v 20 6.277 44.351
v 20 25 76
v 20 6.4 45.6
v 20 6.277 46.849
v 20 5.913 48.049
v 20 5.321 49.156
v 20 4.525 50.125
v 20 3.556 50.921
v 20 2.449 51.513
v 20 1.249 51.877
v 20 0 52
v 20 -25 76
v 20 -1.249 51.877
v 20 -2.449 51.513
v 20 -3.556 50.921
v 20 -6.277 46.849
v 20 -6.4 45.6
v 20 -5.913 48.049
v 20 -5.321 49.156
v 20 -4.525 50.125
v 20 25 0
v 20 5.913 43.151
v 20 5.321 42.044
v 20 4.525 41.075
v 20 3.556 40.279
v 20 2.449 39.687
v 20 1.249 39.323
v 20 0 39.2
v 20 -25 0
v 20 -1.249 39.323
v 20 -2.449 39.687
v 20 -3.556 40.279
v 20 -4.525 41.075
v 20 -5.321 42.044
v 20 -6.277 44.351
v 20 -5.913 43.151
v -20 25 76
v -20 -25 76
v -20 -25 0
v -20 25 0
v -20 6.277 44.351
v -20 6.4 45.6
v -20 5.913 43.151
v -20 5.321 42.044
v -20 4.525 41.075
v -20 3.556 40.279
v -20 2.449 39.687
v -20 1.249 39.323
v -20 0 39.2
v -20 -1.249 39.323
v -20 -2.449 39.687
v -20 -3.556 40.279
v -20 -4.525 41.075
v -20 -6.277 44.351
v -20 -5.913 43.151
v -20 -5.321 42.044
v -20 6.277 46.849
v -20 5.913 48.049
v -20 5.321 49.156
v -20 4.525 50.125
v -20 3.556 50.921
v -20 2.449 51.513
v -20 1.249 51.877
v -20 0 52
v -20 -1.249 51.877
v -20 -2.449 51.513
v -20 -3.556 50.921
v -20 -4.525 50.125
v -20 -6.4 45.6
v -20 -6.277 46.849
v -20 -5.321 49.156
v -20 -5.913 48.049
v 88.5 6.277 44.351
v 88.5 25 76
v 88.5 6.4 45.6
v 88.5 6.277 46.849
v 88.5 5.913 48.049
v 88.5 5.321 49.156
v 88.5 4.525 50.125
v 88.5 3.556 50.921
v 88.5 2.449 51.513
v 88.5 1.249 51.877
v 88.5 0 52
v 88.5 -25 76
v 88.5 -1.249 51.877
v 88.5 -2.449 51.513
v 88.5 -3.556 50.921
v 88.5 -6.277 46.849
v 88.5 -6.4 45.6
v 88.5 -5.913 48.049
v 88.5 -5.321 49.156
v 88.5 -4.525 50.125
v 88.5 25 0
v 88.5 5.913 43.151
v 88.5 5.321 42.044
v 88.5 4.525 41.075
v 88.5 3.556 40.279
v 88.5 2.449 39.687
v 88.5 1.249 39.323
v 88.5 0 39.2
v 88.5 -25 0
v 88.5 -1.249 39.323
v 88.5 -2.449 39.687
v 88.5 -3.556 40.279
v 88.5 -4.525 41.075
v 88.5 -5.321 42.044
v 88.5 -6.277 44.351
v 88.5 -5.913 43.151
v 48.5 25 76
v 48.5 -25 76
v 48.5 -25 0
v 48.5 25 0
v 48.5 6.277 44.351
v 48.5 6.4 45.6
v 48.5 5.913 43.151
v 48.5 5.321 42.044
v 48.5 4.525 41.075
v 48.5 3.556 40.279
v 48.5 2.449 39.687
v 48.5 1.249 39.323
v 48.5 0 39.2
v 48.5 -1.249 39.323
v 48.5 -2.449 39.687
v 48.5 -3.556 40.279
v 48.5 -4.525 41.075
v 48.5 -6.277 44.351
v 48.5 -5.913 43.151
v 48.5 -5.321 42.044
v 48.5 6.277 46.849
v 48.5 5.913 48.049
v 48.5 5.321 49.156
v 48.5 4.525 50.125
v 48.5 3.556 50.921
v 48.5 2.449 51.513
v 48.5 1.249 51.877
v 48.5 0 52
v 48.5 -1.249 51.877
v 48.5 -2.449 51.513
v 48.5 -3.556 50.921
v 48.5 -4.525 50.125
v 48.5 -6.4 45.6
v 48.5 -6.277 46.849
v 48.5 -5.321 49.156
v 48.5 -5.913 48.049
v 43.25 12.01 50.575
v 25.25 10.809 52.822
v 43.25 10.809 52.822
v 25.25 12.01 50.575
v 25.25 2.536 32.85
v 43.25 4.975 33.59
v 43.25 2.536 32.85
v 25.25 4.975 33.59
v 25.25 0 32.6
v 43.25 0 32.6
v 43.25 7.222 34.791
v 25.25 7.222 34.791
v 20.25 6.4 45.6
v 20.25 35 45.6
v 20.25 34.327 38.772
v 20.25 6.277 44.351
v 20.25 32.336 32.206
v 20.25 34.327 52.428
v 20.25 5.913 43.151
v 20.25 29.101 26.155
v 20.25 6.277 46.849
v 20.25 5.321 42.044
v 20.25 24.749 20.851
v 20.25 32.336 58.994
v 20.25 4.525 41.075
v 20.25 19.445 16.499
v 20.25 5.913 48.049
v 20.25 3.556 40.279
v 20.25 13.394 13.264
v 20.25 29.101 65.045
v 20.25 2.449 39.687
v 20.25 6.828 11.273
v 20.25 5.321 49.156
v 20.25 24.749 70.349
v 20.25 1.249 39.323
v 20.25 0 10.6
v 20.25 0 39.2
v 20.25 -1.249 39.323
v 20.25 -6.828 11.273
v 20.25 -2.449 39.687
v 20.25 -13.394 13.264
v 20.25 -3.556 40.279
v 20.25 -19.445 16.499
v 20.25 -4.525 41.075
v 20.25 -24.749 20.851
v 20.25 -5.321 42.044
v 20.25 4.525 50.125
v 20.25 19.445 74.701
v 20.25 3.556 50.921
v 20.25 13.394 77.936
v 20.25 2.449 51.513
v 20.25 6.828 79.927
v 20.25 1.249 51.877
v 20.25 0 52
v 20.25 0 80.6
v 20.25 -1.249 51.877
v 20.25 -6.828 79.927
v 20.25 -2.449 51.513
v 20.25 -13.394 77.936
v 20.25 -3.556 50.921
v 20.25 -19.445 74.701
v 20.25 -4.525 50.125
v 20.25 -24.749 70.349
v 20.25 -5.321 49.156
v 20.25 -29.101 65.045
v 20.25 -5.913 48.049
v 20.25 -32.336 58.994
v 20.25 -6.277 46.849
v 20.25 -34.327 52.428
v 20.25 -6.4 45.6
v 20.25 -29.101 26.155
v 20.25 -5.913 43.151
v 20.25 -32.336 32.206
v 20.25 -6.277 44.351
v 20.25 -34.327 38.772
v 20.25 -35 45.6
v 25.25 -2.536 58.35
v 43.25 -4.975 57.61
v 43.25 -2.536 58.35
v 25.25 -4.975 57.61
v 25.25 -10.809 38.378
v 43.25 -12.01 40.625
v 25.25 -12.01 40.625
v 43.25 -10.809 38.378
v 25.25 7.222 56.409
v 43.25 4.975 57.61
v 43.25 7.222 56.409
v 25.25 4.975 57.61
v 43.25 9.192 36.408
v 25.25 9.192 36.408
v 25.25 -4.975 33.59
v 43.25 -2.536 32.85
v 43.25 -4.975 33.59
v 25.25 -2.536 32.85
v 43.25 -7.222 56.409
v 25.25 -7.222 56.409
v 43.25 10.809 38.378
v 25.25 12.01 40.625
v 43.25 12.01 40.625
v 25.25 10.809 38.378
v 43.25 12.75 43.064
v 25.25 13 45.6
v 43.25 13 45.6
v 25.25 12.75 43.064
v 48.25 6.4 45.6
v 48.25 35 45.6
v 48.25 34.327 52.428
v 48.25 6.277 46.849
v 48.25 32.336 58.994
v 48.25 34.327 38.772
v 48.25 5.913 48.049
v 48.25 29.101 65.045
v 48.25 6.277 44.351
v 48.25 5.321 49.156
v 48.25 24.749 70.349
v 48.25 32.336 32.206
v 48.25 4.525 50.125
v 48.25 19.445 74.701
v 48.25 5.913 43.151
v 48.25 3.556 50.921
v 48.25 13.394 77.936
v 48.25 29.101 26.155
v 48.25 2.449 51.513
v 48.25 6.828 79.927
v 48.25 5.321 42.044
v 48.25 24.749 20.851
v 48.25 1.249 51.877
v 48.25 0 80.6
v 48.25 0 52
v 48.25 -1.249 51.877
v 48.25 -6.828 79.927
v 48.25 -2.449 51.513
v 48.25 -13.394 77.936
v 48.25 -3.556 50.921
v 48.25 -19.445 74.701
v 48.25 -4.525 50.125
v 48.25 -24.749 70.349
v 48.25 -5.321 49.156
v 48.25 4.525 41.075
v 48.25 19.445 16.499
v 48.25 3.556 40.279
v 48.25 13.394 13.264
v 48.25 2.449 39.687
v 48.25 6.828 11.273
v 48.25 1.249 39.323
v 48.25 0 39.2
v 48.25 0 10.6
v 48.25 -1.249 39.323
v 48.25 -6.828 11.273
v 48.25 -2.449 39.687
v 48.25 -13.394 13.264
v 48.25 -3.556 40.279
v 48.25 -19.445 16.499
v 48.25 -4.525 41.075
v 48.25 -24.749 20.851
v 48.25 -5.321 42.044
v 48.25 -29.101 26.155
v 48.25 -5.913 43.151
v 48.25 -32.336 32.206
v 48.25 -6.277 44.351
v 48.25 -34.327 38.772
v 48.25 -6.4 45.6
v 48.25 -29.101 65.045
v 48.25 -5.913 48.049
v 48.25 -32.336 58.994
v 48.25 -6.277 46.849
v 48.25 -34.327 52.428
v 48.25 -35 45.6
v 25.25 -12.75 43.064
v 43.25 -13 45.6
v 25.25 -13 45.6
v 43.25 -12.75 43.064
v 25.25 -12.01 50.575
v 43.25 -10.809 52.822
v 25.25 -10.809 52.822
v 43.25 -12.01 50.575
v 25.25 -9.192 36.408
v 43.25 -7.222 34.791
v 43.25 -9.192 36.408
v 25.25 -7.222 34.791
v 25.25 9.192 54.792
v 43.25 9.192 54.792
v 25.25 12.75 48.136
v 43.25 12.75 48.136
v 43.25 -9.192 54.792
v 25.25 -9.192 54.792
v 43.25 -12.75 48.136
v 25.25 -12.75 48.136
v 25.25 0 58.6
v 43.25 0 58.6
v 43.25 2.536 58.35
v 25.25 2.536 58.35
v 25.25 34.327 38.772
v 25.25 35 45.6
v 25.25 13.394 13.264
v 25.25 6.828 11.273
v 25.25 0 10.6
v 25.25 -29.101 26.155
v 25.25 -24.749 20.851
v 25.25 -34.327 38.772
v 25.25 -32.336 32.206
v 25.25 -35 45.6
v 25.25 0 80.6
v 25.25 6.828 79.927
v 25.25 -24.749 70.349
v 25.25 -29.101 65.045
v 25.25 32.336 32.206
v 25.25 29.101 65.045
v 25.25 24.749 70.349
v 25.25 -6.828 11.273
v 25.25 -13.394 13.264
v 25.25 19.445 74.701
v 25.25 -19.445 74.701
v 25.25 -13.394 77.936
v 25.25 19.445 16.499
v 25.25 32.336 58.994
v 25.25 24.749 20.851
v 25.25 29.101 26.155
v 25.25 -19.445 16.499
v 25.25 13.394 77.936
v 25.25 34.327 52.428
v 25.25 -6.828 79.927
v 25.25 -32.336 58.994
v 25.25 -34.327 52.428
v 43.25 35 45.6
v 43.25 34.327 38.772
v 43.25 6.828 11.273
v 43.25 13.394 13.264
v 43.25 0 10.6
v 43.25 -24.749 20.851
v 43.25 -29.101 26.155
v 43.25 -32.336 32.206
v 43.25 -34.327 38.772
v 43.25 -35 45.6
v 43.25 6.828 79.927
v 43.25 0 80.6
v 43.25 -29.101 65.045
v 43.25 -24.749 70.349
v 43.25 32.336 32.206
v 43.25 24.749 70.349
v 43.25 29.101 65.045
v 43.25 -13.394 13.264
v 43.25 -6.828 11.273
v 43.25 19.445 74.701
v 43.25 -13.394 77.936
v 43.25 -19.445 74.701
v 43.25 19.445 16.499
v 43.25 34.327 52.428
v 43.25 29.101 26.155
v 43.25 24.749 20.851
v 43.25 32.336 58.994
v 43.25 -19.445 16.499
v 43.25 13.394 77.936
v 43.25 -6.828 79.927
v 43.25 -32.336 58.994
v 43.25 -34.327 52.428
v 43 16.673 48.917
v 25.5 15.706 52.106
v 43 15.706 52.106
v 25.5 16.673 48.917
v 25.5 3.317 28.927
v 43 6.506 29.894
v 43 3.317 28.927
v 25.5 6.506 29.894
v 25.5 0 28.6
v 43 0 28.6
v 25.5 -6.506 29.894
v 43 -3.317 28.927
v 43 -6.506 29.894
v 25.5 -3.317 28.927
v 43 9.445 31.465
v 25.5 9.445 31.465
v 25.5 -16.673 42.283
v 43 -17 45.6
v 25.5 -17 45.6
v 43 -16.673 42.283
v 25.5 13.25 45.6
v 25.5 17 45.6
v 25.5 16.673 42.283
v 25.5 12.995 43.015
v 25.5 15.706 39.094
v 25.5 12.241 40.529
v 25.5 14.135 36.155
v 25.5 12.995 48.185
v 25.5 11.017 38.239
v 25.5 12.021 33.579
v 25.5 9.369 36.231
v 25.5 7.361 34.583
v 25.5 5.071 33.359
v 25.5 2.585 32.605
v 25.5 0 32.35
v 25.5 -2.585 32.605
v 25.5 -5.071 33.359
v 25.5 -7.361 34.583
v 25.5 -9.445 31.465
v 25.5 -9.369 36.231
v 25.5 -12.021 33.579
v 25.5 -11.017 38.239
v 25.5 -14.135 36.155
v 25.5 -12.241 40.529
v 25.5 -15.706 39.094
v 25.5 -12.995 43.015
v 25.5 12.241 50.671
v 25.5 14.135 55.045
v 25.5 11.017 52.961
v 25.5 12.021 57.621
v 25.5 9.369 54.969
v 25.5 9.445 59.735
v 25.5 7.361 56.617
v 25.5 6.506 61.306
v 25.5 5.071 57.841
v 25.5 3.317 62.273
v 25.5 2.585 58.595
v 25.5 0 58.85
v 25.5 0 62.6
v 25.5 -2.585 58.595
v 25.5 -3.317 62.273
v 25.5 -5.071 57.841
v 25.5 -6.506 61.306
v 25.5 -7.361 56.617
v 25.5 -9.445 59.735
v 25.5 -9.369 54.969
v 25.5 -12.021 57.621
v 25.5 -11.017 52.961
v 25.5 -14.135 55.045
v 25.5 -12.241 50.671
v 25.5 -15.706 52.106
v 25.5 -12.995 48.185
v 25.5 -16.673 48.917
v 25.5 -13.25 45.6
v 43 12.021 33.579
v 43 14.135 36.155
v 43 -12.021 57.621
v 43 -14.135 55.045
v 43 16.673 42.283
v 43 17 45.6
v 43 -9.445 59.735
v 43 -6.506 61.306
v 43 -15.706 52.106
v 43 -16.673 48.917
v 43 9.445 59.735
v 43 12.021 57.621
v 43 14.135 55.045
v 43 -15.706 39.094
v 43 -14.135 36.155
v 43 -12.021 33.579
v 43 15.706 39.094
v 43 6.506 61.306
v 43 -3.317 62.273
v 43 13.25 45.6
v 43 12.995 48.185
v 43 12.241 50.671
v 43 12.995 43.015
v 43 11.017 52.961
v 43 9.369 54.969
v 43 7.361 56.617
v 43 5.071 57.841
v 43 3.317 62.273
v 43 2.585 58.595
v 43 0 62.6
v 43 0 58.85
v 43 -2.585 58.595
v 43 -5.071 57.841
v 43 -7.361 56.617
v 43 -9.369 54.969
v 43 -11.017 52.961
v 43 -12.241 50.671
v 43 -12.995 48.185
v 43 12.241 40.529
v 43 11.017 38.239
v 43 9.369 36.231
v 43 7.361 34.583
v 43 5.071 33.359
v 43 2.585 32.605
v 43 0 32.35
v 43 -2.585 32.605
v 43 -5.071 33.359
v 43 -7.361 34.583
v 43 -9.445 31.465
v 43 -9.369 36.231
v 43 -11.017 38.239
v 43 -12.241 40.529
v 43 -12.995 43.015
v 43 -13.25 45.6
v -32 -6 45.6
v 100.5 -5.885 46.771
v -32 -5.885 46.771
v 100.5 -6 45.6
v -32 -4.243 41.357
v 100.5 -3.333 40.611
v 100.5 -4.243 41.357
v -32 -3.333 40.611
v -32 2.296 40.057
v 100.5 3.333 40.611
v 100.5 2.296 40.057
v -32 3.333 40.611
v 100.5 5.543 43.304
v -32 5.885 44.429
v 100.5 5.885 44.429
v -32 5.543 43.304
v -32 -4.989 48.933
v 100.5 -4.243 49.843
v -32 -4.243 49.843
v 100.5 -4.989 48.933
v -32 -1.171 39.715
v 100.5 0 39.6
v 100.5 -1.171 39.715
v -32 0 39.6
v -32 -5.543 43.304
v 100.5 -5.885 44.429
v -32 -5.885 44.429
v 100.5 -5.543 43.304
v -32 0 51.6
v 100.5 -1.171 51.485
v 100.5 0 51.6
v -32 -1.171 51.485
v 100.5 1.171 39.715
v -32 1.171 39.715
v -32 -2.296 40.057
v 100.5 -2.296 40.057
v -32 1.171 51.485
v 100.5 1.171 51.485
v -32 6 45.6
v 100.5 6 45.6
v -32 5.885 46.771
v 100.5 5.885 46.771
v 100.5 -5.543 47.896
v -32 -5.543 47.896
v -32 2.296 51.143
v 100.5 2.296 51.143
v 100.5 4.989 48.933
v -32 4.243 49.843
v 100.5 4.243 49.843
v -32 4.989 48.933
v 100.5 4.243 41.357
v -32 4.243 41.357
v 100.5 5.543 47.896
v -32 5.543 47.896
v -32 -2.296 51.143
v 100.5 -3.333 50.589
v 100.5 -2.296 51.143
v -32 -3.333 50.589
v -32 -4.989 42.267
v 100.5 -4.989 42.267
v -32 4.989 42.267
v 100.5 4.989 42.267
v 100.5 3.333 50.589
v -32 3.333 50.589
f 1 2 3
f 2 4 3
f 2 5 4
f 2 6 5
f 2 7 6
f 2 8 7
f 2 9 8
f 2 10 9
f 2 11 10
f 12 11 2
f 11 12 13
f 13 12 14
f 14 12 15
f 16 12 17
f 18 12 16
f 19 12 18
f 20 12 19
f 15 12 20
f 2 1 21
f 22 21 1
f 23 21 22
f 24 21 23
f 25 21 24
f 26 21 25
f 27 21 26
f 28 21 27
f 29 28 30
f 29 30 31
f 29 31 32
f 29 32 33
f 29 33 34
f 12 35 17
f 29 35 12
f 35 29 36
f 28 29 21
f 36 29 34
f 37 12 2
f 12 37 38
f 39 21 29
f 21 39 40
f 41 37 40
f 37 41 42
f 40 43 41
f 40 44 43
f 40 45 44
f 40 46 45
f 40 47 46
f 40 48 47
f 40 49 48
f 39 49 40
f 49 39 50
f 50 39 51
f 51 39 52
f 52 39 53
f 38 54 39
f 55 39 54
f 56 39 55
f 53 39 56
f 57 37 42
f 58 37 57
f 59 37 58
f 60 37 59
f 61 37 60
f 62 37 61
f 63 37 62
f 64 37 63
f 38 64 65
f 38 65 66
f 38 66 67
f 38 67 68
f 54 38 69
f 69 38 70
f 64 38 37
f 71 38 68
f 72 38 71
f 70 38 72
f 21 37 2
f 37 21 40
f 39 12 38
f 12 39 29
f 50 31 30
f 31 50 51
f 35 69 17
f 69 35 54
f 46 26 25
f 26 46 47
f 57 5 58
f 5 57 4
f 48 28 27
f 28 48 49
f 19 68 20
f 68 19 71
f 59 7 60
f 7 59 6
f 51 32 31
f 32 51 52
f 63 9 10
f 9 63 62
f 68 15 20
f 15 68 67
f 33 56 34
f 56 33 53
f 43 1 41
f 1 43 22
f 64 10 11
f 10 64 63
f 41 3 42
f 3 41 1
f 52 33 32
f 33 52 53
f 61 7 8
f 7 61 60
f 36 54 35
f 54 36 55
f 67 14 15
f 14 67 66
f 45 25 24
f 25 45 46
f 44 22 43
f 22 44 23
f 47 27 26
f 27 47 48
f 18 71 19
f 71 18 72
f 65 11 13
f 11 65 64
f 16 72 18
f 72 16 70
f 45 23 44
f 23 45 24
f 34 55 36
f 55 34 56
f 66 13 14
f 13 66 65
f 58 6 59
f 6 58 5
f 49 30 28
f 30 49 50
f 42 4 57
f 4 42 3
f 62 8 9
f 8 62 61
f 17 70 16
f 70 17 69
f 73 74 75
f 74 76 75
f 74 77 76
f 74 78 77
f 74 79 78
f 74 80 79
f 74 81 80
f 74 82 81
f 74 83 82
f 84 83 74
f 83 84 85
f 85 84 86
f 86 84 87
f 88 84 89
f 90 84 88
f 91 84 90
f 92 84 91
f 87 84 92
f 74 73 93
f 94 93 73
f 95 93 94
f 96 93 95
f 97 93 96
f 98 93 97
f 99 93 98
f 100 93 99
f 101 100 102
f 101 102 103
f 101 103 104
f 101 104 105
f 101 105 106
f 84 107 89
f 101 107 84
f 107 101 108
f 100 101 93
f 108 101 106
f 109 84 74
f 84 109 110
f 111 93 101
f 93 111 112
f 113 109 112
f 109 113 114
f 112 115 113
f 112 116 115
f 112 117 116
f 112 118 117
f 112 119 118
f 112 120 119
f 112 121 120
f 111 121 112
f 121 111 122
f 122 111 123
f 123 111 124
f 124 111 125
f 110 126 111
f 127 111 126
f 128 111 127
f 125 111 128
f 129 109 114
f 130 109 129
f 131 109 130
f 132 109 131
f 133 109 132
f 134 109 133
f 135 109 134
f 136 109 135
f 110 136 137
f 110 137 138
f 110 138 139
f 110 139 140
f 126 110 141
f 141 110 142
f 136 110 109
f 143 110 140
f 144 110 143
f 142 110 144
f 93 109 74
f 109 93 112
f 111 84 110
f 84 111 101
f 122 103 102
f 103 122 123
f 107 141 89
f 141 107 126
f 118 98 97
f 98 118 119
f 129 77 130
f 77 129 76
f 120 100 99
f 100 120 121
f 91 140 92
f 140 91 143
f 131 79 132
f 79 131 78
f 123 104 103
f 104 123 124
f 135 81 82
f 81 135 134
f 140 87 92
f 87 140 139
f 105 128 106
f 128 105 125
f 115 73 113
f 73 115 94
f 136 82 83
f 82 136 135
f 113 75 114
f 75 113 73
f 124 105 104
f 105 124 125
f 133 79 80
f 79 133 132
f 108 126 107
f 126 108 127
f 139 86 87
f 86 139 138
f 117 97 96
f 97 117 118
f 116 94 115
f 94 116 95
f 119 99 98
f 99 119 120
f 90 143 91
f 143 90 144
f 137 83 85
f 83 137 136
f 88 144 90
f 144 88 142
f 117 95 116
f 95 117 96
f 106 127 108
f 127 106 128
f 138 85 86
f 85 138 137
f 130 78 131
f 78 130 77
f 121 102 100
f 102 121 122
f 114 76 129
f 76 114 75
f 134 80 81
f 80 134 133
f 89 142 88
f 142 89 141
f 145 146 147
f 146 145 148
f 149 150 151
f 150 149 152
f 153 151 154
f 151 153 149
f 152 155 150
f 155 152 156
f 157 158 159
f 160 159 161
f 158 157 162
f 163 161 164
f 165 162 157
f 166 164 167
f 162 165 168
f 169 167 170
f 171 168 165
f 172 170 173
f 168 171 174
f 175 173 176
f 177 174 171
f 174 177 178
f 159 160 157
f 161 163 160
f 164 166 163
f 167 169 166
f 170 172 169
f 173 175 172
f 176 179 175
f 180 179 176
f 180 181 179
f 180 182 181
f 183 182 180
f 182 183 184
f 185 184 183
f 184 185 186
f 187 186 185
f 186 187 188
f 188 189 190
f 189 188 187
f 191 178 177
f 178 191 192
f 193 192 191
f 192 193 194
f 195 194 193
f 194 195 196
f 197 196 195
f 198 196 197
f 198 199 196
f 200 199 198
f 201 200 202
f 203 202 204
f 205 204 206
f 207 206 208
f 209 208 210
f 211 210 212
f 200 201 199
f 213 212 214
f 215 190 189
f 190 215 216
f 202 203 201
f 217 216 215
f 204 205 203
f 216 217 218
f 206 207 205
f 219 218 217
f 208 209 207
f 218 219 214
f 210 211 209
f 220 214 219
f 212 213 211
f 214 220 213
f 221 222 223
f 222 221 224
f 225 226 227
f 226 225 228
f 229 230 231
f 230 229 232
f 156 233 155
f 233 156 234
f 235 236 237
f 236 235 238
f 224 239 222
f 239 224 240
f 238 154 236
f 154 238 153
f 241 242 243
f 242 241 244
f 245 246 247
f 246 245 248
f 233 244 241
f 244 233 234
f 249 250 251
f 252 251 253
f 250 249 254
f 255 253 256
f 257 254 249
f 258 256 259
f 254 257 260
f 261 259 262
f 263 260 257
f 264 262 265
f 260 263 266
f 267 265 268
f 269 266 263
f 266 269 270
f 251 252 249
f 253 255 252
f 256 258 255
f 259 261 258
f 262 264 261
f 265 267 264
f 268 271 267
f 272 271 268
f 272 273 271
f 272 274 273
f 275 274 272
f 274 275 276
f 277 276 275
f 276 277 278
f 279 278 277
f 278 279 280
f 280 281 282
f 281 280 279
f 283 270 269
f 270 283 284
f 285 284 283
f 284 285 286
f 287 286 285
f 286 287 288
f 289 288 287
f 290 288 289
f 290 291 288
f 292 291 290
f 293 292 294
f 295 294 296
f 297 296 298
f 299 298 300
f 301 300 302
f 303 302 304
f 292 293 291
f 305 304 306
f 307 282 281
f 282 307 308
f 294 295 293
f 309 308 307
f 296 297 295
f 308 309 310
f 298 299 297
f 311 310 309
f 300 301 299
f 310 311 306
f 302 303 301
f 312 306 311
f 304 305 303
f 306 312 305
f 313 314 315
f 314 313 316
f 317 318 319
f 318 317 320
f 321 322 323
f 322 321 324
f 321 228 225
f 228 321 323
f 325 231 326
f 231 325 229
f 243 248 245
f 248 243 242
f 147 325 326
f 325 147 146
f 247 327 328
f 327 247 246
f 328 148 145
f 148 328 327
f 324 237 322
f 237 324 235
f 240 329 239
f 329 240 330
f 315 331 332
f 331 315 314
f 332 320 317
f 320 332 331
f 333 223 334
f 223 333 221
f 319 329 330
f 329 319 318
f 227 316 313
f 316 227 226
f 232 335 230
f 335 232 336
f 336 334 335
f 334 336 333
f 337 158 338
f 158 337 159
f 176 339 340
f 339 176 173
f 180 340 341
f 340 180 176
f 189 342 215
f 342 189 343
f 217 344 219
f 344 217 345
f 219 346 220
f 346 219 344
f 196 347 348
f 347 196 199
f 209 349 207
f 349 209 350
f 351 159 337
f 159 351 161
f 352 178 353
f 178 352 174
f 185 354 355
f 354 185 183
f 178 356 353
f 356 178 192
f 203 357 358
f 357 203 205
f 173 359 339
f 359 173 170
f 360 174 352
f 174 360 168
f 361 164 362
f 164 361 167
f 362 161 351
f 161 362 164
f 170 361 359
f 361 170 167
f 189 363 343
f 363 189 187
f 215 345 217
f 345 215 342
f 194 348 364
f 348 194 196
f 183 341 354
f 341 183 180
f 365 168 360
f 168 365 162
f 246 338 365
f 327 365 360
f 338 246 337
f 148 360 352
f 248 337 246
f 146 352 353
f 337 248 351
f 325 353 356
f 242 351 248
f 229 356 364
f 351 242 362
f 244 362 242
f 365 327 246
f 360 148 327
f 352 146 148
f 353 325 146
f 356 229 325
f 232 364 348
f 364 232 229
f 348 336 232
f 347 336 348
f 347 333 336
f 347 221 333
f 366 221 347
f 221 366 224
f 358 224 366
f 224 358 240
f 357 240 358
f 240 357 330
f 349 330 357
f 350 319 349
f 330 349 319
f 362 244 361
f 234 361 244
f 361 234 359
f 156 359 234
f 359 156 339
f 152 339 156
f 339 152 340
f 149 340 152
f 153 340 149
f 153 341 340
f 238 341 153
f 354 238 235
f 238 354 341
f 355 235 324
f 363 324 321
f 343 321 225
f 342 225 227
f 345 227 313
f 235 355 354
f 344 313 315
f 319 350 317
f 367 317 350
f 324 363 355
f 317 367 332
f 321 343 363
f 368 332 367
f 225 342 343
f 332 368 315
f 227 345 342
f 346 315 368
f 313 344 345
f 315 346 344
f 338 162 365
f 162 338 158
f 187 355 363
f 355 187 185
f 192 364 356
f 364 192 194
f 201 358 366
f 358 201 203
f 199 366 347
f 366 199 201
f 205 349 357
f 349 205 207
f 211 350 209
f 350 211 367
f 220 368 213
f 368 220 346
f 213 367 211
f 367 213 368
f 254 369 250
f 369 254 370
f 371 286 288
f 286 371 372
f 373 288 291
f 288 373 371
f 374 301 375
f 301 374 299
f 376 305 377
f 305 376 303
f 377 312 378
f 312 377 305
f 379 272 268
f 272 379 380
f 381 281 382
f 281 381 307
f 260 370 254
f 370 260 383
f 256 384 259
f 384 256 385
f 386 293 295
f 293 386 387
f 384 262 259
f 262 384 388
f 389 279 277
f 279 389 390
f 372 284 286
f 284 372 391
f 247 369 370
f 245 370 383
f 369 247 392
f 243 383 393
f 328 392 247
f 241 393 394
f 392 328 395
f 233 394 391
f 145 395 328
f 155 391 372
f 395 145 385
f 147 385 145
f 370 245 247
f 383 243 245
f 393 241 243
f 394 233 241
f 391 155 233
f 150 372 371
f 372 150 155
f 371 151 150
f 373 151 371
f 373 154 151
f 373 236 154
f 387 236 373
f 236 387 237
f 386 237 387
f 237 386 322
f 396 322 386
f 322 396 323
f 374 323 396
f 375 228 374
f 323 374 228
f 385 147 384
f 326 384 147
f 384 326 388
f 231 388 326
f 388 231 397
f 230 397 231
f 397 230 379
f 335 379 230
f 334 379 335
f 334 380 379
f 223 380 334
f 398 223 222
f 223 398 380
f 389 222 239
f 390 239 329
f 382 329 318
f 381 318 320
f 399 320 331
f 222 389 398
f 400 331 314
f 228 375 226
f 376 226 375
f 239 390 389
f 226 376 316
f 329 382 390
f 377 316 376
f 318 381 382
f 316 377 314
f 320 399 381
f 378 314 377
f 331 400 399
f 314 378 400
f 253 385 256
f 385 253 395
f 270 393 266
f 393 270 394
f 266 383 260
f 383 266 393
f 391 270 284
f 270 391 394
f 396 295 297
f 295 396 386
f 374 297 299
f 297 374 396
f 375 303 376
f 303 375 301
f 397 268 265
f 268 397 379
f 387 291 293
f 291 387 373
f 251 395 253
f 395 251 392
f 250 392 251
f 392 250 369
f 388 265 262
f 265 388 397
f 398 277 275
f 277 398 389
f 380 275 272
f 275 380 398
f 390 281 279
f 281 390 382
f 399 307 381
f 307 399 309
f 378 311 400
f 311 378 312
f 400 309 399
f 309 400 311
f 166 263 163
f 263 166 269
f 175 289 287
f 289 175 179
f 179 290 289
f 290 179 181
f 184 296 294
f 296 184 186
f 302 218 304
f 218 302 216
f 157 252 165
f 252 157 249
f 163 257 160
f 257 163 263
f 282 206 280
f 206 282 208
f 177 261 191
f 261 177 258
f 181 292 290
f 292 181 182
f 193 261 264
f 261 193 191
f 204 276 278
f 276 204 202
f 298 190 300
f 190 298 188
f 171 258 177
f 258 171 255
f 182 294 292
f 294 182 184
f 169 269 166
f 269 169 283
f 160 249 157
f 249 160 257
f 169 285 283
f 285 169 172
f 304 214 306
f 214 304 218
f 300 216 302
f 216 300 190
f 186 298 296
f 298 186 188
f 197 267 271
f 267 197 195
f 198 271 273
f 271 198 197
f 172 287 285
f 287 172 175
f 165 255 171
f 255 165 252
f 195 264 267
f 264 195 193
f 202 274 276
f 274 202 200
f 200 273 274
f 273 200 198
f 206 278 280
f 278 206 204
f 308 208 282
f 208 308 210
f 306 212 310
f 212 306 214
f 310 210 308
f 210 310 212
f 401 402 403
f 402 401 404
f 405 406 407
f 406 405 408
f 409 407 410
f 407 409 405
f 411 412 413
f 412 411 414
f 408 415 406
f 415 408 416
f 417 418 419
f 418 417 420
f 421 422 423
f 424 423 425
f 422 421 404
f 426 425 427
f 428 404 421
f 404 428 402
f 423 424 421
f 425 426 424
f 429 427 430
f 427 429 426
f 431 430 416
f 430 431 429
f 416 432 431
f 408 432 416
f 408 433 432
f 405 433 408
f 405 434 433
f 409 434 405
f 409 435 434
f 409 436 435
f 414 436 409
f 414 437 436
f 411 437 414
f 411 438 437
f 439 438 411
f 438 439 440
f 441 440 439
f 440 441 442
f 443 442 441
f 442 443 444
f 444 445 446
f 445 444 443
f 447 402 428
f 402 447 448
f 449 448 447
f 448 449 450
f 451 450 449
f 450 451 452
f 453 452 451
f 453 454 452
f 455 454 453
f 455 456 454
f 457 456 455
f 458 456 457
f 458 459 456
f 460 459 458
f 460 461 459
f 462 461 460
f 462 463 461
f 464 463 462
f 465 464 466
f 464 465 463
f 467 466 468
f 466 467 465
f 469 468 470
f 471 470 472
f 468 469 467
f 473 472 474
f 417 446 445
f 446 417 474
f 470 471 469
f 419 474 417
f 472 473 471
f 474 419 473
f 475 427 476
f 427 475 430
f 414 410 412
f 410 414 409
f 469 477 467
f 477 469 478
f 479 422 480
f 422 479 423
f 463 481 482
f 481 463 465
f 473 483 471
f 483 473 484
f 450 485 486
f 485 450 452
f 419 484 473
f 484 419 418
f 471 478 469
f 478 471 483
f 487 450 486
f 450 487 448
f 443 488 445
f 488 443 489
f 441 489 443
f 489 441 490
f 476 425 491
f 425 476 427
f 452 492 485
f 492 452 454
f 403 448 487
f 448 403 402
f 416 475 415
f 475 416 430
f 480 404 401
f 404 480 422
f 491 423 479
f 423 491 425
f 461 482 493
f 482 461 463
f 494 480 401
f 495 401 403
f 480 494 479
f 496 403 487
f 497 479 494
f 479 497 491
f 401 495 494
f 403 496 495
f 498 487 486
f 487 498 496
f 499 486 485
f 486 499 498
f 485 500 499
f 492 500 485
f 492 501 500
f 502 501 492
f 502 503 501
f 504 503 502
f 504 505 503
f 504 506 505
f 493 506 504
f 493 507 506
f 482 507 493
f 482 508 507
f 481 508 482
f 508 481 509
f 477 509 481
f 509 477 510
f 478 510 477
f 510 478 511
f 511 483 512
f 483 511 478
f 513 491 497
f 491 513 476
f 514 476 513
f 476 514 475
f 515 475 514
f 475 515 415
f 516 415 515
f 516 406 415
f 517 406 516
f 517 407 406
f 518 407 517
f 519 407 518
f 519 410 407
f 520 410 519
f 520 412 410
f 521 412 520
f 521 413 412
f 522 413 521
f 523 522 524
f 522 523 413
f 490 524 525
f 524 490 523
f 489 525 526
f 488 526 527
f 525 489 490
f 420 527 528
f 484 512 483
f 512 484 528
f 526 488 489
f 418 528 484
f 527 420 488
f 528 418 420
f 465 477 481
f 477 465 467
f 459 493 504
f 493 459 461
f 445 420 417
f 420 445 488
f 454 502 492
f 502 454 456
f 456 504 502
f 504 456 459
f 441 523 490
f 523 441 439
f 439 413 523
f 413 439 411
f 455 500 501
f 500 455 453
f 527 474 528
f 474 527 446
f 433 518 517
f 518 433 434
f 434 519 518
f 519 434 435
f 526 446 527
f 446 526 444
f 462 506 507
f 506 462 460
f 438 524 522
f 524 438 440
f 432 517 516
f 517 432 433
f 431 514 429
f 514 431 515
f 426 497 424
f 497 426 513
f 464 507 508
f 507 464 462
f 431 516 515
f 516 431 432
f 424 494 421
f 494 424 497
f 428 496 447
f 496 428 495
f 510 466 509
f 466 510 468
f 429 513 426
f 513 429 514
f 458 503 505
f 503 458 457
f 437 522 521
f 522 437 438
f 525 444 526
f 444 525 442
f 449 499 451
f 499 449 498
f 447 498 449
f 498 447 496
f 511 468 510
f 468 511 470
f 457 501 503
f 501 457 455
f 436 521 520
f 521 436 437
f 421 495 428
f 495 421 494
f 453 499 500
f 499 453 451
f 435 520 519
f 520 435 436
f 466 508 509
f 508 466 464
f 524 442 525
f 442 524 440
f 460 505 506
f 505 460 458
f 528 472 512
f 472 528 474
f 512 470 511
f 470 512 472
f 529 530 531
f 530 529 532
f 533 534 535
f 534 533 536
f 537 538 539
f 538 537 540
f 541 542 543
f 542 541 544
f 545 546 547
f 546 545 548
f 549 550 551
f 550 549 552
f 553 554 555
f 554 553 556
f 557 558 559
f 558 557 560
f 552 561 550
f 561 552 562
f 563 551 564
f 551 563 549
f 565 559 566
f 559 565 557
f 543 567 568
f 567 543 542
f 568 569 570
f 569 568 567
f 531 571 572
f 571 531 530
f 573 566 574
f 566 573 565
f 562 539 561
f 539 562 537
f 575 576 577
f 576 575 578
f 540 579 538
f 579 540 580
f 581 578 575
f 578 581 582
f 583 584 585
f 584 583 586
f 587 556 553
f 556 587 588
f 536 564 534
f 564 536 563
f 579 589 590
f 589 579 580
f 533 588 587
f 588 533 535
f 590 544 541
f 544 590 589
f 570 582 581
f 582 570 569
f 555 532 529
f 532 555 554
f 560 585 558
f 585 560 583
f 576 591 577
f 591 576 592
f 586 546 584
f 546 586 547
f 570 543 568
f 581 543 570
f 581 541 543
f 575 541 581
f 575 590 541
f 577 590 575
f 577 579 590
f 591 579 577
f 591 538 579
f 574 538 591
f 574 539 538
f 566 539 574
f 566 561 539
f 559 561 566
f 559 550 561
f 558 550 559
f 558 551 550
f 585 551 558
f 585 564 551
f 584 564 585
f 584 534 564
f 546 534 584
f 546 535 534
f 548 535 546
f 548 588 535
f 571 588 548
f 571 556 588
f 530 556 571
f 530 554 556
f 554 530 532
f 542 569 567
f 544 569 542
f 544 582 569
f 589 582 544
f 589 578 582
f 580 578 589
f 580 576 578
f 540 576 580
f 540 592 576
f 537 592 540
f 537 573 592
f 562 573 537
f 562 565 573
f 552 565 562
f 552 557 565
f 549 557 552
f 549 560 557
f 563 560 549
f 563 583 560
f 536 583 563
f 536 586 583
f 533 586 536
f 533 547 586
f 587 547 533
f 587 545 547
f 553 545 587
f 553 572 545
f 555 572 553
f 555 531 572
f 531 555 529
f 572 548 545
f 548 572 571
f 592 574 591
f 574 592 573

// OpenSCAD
$fn = 32;

// ------------------------------------------------------------------------
// Pulley assembly: d70 pulley with a belt, shaft d12
// Every part is its own module, assembly() places them once.
// ------------------------------------------------------------------------

// --- part 1 ---
module support1() {
  difference() {
    translate([-20, -25, 0]) cube([40, 50, 76]);
    translate([0, 0, 45.6]) rotate([0, 90, 0]) cylinder(h = 42, d = 12.8, center = true);
  }
}

// --- part 2 ---
module support2() {
  difference() {
    translate([-20, -25, 0]) cube([40, 50, 76]);
    translate([0, 0, 45.6]) rotate([0, 90, 0]) cylinder(h = 42, d = 12.8, center = true);
  }
}

// --- part 3 ---
module shaft() {
  translate([0, 0, -66.25]) cylinder(h = 132.5, d = 12);
}

// --- part 4 ---
module pulley() {
  difference() {
    union() {
      cylinder(h = 28, d = 26);
      cylinder(h = 5, d = 70);
      translate([0, 0, 23]) cylinder(h = 5, d = 70);
    }
    translate([0, 0, -1]) cylinder(h = 30, d = 12.8);
  }
}

// --- part 5 ---
module belt() {
  difference() {
      translate([0, 0, 0]) cylinder(h = 17.5, d = 34);
      translate([0, 0, -1]) cylinder(h = 19.5, d = 26.5);
    }
}

// --- assembly ---
module assembly() {
  translate([0, 0, 0]) rotate([0, 0, 0]) support1();
  translate([68.5, 0, 0]) rotate([0, 0, 0]) support2();
  translate([34.25, 0, 45.6]) rotate([0, 90, 0]) shaft();
  translate([20.25, 0, 45.6]) rotate([0, 90, 0]) pulley();
  translate([25.5, 0, 45.6]) rotate([0, 90, 0]) belt();
}

assembly();
